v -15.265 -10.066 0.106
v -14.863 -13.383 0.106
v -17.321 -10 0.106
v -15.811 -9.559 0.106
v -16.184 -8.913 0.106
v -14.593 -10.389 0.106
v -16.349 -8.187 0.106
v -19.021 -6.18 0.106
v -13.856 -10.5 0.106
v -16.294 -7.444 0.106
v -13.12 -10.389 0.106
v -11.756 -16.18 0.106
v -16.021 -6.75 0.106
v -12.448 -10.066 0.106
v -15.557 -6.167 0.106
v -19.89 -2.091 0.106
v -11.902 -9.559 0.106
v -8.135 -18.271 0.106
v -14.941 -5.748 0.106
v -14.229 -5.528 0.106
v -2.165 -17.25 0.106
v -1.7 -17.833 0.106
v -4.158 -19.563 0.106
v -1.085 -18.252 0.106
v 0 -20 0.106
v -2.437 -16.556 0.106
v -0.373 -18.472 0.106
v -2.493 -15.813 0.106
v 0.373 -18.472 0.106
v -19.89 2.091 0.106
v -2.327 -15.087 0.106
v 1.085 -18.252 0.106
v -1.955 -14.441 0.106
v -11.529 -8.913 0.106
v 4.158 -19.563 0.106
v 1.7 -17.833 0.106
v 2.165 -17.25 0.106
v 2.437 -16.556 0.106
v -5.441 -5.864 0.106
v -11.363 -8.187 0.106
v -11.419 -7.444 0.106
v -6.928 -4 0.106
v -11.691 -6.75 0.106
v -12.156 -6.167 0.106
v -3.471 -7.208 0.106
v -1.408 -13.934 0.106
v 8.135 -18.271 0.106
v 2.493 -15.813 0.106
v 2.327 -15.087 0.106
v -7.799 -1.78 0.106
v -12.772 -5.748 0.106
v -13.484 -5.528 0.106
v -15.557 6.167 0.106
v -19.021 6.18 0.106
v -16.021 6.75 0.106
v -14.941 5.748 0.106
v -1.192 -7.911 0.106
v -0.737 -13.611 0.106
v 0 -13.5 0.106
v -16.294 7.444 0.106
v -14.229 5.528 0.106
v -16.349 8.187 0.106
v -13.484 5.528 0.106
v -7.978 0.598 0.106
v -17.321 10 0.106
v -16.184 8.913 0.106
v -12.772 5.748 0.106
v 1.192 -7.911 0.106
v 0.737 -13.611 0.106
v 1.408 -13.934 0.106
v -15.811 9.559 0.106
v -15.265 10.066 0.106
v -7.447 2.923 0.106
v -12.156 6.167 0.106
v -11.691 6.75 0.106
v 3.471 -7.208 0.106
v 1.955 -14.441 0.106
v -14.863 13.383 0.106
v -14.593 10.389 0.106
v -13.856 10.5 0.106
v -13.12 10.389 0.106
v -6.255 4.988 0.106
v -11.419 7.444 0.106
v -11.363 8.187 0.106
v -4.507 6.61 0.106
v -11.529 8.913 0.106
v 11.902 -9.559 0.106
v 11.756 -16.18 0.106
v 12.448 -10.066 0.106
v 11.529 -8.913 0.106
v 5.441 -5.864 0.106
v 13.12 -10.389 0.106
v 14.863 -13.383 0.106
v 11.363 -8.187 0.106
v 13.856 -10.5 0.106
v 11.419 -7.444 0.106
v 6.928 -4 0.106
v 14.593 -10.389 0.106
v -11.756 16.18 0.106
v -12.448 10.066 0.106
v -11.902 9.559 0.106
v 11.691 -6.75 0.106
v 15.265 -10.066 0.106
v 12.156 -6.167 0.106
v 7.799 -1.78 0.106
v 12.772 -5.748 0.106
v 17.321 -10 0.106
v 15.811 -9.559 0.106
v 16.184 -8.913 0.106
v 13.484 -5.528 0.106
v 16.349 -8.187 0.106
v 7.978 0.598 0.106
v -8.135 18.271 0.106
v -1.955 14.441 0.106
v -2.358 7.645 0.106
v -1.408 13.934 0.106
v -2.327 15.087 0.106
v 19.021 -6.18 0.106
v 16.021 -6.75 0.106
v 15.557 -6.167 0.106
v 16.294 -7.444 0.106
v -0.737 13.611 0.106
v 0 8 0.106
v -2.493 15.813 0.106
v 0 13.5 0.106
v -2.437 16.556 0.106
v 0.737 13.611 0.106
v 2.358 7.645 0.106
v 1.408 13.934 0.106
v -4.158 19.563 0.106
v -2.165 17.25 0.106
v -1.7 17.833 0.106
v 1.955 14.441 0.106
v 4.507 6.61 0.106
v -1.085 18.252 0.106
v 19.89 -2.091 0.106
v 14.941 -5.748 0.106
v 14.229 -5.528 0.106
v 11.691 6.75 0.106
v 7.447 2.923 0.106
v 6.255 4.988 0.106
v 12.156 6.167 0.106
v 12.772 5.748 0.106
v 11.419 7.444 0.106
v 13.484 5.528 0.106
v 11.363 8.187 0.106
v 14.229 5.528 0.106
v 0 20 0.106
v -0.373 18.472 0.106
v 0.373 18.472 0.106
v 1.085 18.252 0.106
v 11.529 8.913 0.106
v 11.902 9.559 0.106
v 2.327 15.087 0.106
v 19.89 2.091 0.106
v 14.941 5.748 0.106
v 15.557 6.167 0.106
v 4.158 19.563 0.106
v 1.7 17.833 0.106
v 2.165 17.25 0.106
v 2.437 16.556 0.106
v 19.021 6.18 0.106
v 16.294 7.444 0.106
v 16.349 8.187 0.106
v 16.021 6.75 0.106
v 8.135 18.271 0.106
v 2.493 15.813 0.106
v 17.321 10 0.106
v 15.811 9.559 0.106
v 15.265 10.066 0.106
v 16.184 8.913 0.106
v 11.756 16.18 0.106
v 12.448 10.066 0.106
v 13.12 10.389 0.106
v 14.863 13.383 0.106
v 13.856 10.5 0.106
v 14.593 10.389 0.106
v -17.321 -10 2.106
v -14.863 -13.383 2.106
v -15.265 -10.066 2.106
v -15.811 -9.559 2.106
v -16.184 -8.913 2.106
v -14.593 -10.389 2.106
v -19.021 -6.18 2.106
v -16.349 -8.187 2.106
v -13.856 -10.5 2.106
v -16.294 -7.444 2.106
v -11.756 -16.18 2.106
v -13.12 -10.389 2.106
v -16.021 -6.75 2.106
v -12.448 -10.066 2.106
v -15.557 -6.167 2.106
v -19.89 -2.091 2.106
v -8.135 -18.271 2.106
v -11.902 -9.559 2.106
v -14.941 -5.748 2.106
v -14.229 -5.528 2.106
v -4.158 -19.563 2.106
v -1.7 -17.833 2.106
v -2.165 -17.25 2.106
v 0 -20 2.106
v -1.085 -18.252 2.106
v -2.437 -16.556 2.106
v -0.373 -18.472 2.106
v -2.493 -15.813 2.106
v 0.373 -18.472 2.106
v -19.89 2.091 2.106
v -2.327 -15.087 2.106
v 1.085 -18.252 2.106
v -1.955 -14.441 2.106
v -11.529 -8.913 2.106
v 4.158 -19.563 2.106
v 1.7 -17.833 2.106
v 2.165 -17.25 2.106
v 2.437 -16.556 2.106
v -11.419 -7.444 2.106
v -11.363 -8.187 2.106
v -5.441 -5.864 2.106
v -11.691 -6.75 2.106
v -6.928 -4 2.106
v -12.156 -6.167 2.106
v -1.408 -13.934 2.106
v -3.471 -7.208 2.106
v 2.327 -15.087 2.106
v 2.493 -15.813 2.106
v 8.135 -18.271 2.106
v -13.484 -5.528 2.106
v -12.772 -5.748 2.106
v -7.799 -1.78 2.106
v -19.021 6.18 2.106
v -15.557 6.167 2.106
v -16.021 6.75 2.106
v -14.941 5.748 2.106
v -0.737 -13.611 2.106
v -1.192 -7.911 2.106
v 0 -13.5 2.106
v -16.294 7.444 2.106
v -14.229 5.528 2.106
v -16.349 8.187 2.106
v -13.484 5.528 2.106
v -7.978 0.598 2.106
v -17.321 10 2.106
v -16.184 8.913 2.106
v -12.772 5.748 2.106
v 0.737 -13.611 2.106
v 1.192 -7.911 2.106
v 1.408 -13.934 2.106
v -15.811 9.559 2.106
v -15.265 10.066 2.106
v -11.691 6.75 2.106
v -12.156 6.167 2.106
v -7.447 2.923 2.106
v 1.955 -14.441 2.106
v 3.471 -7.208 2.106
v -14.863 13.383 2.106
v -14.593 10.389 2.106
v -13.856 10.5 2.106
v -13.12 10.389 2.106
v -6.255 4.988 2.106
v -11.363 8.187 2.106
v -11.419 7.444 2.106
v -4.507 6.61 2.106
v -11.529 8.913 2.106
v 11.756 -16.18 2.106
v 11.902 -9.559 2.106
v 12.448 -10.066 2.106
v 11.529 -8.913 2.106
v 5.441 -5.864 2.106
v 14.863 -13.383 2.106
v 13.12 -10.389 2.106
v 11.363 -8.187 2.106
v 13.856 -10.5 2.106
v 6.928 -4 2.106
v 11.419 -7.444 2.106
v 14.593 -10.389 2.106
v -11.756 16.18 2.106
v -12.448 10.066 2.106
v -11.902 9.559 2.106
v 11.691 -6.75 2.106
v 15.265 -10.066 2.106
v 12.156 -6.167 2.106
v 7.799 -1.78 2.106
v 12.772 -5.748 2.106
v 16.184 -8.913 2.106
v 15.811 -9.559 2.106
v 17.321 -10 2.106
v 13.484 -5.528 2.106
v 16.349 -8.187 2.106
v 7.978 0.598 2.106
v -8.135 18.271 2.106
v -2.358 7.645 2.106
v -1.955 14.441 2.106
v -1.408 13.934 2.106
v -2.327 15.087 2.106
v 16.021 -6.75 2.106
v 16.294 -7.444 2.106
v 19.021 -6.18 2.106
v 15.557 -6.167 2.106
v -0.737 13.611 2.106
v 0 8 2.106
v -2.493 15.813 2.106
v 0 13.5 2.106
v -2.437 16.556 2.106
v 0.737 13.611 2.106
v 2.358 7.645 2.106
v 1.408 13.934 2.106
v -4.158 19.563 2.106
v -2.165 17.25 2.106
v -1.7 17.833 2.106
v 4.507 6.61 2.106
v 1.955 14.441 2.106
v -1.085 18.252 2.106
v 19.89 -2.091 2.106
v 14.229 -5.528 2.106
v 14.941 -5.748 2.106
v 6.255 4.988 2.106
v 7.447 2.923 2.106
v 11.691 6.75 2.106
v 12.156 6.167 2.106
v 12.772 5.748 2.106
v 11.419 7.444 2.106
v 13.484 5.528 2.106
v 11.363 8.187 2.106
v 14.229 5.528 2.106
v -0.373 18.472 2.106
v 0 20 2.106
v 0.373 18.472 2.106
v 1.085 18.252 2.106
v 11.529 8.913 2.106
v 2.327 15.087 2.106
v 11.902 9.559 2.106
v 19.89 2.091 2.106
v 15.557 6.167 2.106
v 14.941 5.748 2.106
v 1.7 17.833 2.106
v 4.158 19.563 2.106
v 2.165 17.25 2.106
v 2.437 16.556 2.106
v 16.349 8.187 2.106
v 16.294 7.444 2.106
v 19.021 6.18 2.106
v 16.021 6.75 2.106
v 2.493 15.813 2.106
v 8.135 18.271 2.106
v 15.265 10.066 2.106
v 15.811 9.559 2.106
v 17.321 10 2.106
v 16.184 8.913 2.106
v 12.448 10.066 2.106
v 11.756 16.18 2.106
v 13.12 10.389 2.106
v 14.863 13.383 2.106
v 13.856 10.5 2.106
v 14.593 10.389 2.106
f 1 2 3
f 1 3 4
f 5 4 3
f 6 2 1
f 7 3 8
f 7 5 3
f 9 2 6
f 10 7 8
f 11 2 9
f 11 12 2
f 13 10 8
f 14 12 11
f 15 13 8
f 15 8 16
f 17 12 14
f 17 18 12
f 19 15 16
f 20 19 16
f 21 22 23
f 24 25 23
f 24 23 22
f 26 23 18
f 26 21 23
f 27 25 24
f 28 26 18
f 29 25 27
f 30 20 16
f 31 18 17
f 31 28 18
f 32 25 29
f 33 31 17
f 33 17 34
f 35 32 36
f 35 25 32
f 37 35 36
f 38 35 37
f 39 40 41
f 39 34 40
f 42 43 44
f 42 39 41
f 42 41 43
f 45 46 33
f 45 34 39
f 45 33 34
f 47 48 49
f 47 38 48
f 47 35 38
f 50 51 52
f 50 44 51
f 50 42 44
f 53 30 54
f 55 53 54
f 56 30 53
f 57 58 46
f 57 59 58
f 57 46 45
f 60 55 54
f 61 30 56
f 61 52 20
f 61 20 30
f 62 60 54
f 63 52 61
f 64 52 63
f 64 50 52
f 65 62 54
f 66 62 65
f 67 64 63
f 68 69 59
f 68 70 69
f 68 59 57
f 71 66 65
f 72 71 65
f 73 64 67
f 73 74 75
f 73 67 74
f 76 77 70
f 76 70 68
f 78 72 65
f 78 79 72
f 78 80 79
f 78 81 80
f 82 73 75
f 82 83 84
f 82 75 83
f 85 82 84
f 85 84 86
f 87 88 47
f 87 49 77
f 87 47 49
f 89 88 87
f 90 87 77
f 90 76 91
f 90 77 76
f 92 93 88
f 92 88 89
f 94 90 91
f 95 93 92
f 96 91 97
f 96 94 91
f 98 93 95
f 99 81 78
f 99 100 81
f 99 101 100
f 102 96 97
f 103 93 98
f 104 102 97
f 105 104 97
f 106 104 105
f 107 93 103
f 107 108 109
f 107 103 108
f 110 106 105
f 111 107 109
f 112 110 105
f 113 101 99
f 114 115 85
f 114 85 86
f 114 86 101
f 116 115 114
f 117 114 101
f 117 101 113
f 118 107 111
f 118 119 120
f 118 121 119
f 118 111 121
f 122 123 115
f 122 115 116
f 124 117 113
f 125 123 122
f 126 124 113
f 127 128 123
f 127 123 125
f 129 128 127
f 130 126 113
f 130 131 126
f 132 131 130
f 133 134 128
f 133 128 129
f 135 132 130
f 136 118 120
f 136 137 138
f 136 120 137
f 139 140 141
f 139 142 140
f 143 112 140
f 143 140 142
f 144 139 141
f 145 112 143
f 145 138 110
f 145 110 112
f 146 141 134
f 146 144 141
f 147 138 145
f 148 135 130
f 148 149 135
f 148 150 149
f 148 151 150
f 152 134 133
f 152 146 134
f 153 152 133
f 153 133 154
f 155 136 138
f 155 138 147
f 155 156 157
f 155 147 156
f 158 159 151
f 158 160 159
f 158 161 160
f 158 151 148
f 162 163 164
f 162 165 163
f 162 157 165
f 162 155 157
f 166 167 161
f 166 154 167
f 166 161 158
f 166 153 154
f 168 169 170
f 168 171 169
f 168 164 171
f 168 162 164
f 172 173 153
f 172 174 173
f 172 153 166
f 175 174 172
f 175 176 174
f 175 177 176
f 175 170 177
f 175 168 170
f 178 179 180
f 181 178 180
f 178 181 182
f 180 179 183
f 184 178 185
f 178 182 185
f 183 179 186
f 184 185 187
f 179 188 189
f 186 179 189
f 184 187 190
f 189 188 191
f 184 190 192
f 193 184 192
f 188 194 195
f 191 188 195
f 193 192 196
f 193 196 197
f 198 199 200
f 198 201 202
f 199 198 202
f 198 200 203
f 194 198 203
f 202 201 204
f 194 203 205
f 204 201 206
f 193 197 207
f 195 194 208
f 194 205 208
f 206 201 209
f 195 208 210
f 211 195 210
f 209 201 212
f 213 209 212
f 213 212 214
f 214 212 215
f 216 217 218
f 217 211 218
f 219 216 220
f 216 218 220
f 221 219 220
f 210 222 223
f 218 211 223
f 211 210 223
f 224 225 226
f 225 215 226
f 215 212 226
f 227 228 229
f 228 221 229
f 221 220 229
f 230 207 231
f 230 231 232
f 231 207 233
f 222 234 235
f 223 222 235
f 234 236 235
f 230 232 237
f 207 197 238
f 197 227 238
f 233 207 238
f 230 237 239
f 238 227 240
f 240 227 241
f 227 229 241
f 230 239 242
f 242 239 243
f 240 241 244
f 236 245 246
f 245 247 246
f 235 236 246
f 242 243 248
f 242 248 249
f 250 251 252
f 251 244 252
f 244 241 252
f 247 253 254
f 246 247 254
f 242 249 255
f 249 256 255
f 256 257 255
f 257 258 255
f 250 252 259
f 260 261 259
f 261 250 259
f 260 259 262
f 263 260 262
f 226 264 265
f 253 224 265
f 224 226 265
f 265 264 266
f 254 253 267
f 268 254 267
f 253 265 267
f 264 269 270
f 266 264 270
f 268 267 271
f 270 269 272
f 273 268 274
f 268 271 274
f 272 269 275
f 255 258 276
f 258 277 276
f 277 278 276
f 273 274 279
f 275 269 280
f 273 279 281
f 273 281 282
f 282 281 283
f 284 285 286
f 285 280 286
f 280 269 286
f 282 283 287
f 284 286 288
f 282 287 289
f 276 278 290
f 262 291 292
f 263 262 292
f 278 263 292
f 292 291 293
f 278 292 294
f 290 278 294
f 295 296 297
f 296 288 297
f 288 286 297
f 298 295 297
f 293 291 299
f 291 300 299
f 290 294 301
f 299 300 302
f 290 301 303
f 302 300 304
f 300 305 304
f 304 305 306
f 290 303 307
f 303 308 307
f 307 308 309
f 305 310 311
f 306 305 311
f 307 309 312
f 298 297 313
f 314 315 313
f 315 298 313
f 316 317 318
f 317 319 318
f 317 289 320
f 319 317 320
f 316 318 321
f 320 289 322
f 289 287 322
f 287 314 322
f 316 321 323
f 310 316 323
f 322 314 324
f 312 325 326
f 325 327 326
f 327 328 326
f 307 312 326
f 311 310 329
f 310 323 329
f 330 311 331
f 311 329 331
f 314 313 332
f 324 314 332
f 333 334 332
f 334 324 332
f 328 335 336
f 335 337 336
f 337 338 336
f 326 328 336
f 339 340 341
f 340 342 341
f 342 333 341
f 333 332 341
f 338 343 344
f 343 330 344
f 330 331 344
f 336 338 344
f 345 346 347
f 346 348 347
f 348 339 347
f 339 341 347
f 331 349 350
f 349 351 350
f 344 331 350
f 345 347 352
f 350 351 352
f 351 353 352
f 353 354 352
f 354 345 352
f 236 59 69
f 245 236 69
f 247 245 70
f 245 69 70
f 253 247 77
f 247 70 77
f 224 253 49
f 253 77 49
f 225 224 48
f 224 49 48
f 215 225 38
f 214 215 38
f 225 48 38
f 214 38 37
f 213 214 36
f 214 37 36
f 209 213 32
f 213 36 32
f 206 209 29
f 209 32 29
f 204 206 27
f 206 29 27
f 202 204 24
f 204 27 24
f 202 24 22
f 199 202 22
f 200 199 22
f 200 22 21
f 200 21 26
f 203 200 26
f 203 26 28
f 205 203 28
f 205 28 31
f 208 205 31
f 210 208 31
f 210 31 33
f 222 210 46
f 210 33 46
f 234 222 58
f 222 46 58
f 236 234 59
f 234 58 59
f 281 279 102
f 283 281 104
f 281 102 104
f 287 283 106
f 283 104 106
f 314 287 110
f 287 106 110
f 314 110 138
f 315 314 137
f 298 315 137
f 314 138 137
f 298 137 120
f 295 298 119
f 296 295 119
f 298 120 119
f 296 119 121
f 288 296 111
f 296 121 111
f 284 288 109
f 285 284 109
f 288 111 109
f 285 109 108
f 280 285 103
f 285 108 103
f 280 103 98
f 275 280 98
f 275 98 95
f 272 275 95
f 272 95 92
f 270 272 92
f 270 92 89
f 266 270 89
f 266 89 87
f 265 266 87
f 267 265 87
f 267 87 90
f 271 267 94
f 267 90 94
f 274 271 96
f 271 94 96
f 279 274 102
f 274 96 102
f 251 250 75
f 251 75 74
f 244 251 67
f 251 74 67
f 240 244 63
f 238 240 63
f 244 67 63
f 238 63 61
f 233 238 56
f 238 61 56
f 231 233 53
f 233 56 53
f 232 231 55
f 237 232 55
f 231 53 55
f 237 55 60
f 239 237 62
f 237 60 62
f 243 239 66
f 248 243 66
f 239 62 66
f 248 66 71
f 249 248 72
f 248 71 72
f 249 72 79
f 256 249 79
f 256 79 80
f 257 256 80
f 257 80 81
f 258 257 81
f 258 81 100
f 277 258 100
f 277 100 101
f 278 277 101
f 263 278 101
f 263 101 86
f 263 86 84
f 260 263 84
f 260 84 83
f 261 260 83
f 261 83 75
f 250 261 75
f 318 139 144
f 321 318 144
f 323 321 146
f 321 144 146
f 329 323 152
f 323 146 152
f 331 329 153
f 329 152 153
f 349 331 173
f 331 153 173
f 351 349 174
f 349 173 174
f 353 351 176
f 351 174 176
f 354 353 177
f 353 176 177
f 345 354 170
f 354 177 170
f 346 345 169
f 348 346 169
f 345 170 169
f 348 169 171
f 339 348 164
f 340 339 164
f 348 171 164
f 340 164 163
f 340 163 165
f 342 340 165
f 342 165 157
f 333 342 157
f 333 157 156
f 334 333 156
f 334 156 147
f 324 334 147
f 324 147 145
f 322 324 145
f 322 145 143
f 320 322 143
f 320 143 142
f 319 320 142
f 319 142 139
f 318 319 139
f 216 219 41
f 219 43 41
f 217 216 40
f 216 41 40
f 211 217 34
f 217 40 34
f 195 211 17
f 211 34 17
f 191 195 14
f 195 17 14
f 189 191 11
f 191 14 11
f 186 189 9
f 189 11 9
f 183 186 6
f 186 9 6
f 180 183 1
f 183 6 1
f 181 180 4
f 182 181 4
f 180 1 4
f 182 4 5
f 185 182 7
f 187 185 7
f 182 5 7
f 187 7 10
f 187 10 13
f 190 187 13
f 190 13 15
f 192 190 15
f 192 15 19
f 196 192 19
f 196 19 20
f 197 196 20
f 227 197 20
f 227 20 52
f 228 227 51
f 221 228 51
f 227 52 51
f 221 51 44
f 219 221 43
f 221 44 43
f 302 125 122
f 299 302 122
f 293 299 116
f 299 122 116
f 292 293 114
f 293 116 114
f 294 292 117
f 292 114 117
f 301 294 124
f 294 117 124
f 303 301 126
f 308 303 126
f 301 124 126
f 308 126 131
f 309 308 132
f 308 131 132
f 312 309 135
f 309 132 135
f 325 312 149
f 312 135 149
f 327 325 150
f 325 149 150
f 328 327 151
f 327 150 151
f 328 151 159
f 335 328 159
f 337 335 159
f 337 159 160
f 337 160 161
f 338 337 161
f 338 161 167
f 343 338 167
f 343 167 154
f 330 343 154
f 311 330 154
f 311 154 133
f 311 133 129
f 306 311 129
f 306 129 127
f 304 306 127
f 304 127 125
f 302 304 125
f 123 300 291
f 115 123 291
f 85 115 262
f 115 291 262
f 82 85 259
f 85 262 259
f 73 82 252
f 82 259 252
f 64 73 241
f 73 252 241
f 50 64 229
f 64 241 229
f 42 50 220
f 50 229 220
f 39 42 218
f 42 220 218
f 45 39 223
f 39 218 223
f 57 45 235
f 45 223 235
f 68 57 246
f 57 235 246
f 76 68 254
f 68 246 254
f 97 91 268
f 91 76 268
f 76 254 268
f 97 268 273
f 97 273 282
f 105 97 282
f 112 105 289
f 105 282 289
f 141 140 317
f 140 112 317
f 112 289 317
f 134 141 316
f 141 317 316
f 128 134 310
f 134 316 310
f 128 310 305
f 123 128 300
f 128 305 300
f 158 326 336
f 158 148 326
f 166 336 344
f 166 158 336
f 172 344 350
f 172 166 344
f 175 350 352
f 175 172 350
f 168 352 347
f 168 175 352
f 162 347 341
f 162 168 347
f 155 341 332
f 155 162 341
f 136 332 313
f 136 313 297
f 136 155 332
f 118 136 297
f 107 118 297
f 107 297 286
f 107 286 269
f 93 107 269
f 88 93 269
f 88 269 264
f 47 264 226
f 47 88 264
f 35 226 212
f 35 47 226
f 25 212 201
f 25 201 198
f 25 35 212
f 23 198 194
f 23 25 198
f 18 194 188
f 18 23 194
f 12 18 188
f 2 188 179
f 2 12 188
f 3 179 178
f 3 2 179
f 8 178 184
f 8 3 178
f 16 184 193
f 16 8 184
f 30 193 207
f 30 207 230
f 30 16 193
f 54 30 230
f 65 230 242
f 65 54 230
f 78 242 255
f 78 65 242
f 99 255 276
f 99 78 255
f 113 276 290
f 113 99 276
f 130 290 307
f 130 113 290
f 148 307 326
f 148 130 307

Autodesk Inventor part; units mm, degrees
ref_plane "YZ Plane" through (0, 0, 0) normal (1, 0, 0) x (0, 1, 0)
ref_plane "XZ Plane" through (0, 0, 0) normal (0, 1, 0) x (-1, 0, 0)
ref_plane "XY Plane" through (0, 0, 0) normal (0, 0, 1) x (1, 0, 0)
sketch "Sketch1" plane through (0, 0, 0) normal (1, 0, 0) x (0, 1, 0)
  line L0 (0, 0) -> (0, -33.1818)
  line L1 (8, 2.1062) -> (20, 2.1062)
  line L2 (20, 2.1062) -> (20, 0.1062)
  line L3 (20, 0.1062) -> (8, 0.1062)
  line L4 (8, 0.1062) -> (8, 2.1062)
  dimension "d3" = 2
  dimension "d4" = 40
  dimension "d28" = 16
revolve "Revolution1" add sketch "Sketch1" angle 360 about axis through (0, 0, 0) along (0, 0, -1)
sketch "Sketch2" plane through (0, 0, 2.1062) normal (0, 0, 1) x (1, 0, 0)
  point P0 (0, 0)
  point P1 (0, 16)
  dimension "d6" = 16
hole "Hole1" at (0, 16, 2.1062) direction (0, 0, -1) diameter 5 end through all
pattern_circular "Circular Pattern1" count 6 over 360 about axis through (0, 0, 1.1062) along (0, 0, -1) of "Hole1"
properties part number "PTFESeal" material "Polyethylene, High Density"
